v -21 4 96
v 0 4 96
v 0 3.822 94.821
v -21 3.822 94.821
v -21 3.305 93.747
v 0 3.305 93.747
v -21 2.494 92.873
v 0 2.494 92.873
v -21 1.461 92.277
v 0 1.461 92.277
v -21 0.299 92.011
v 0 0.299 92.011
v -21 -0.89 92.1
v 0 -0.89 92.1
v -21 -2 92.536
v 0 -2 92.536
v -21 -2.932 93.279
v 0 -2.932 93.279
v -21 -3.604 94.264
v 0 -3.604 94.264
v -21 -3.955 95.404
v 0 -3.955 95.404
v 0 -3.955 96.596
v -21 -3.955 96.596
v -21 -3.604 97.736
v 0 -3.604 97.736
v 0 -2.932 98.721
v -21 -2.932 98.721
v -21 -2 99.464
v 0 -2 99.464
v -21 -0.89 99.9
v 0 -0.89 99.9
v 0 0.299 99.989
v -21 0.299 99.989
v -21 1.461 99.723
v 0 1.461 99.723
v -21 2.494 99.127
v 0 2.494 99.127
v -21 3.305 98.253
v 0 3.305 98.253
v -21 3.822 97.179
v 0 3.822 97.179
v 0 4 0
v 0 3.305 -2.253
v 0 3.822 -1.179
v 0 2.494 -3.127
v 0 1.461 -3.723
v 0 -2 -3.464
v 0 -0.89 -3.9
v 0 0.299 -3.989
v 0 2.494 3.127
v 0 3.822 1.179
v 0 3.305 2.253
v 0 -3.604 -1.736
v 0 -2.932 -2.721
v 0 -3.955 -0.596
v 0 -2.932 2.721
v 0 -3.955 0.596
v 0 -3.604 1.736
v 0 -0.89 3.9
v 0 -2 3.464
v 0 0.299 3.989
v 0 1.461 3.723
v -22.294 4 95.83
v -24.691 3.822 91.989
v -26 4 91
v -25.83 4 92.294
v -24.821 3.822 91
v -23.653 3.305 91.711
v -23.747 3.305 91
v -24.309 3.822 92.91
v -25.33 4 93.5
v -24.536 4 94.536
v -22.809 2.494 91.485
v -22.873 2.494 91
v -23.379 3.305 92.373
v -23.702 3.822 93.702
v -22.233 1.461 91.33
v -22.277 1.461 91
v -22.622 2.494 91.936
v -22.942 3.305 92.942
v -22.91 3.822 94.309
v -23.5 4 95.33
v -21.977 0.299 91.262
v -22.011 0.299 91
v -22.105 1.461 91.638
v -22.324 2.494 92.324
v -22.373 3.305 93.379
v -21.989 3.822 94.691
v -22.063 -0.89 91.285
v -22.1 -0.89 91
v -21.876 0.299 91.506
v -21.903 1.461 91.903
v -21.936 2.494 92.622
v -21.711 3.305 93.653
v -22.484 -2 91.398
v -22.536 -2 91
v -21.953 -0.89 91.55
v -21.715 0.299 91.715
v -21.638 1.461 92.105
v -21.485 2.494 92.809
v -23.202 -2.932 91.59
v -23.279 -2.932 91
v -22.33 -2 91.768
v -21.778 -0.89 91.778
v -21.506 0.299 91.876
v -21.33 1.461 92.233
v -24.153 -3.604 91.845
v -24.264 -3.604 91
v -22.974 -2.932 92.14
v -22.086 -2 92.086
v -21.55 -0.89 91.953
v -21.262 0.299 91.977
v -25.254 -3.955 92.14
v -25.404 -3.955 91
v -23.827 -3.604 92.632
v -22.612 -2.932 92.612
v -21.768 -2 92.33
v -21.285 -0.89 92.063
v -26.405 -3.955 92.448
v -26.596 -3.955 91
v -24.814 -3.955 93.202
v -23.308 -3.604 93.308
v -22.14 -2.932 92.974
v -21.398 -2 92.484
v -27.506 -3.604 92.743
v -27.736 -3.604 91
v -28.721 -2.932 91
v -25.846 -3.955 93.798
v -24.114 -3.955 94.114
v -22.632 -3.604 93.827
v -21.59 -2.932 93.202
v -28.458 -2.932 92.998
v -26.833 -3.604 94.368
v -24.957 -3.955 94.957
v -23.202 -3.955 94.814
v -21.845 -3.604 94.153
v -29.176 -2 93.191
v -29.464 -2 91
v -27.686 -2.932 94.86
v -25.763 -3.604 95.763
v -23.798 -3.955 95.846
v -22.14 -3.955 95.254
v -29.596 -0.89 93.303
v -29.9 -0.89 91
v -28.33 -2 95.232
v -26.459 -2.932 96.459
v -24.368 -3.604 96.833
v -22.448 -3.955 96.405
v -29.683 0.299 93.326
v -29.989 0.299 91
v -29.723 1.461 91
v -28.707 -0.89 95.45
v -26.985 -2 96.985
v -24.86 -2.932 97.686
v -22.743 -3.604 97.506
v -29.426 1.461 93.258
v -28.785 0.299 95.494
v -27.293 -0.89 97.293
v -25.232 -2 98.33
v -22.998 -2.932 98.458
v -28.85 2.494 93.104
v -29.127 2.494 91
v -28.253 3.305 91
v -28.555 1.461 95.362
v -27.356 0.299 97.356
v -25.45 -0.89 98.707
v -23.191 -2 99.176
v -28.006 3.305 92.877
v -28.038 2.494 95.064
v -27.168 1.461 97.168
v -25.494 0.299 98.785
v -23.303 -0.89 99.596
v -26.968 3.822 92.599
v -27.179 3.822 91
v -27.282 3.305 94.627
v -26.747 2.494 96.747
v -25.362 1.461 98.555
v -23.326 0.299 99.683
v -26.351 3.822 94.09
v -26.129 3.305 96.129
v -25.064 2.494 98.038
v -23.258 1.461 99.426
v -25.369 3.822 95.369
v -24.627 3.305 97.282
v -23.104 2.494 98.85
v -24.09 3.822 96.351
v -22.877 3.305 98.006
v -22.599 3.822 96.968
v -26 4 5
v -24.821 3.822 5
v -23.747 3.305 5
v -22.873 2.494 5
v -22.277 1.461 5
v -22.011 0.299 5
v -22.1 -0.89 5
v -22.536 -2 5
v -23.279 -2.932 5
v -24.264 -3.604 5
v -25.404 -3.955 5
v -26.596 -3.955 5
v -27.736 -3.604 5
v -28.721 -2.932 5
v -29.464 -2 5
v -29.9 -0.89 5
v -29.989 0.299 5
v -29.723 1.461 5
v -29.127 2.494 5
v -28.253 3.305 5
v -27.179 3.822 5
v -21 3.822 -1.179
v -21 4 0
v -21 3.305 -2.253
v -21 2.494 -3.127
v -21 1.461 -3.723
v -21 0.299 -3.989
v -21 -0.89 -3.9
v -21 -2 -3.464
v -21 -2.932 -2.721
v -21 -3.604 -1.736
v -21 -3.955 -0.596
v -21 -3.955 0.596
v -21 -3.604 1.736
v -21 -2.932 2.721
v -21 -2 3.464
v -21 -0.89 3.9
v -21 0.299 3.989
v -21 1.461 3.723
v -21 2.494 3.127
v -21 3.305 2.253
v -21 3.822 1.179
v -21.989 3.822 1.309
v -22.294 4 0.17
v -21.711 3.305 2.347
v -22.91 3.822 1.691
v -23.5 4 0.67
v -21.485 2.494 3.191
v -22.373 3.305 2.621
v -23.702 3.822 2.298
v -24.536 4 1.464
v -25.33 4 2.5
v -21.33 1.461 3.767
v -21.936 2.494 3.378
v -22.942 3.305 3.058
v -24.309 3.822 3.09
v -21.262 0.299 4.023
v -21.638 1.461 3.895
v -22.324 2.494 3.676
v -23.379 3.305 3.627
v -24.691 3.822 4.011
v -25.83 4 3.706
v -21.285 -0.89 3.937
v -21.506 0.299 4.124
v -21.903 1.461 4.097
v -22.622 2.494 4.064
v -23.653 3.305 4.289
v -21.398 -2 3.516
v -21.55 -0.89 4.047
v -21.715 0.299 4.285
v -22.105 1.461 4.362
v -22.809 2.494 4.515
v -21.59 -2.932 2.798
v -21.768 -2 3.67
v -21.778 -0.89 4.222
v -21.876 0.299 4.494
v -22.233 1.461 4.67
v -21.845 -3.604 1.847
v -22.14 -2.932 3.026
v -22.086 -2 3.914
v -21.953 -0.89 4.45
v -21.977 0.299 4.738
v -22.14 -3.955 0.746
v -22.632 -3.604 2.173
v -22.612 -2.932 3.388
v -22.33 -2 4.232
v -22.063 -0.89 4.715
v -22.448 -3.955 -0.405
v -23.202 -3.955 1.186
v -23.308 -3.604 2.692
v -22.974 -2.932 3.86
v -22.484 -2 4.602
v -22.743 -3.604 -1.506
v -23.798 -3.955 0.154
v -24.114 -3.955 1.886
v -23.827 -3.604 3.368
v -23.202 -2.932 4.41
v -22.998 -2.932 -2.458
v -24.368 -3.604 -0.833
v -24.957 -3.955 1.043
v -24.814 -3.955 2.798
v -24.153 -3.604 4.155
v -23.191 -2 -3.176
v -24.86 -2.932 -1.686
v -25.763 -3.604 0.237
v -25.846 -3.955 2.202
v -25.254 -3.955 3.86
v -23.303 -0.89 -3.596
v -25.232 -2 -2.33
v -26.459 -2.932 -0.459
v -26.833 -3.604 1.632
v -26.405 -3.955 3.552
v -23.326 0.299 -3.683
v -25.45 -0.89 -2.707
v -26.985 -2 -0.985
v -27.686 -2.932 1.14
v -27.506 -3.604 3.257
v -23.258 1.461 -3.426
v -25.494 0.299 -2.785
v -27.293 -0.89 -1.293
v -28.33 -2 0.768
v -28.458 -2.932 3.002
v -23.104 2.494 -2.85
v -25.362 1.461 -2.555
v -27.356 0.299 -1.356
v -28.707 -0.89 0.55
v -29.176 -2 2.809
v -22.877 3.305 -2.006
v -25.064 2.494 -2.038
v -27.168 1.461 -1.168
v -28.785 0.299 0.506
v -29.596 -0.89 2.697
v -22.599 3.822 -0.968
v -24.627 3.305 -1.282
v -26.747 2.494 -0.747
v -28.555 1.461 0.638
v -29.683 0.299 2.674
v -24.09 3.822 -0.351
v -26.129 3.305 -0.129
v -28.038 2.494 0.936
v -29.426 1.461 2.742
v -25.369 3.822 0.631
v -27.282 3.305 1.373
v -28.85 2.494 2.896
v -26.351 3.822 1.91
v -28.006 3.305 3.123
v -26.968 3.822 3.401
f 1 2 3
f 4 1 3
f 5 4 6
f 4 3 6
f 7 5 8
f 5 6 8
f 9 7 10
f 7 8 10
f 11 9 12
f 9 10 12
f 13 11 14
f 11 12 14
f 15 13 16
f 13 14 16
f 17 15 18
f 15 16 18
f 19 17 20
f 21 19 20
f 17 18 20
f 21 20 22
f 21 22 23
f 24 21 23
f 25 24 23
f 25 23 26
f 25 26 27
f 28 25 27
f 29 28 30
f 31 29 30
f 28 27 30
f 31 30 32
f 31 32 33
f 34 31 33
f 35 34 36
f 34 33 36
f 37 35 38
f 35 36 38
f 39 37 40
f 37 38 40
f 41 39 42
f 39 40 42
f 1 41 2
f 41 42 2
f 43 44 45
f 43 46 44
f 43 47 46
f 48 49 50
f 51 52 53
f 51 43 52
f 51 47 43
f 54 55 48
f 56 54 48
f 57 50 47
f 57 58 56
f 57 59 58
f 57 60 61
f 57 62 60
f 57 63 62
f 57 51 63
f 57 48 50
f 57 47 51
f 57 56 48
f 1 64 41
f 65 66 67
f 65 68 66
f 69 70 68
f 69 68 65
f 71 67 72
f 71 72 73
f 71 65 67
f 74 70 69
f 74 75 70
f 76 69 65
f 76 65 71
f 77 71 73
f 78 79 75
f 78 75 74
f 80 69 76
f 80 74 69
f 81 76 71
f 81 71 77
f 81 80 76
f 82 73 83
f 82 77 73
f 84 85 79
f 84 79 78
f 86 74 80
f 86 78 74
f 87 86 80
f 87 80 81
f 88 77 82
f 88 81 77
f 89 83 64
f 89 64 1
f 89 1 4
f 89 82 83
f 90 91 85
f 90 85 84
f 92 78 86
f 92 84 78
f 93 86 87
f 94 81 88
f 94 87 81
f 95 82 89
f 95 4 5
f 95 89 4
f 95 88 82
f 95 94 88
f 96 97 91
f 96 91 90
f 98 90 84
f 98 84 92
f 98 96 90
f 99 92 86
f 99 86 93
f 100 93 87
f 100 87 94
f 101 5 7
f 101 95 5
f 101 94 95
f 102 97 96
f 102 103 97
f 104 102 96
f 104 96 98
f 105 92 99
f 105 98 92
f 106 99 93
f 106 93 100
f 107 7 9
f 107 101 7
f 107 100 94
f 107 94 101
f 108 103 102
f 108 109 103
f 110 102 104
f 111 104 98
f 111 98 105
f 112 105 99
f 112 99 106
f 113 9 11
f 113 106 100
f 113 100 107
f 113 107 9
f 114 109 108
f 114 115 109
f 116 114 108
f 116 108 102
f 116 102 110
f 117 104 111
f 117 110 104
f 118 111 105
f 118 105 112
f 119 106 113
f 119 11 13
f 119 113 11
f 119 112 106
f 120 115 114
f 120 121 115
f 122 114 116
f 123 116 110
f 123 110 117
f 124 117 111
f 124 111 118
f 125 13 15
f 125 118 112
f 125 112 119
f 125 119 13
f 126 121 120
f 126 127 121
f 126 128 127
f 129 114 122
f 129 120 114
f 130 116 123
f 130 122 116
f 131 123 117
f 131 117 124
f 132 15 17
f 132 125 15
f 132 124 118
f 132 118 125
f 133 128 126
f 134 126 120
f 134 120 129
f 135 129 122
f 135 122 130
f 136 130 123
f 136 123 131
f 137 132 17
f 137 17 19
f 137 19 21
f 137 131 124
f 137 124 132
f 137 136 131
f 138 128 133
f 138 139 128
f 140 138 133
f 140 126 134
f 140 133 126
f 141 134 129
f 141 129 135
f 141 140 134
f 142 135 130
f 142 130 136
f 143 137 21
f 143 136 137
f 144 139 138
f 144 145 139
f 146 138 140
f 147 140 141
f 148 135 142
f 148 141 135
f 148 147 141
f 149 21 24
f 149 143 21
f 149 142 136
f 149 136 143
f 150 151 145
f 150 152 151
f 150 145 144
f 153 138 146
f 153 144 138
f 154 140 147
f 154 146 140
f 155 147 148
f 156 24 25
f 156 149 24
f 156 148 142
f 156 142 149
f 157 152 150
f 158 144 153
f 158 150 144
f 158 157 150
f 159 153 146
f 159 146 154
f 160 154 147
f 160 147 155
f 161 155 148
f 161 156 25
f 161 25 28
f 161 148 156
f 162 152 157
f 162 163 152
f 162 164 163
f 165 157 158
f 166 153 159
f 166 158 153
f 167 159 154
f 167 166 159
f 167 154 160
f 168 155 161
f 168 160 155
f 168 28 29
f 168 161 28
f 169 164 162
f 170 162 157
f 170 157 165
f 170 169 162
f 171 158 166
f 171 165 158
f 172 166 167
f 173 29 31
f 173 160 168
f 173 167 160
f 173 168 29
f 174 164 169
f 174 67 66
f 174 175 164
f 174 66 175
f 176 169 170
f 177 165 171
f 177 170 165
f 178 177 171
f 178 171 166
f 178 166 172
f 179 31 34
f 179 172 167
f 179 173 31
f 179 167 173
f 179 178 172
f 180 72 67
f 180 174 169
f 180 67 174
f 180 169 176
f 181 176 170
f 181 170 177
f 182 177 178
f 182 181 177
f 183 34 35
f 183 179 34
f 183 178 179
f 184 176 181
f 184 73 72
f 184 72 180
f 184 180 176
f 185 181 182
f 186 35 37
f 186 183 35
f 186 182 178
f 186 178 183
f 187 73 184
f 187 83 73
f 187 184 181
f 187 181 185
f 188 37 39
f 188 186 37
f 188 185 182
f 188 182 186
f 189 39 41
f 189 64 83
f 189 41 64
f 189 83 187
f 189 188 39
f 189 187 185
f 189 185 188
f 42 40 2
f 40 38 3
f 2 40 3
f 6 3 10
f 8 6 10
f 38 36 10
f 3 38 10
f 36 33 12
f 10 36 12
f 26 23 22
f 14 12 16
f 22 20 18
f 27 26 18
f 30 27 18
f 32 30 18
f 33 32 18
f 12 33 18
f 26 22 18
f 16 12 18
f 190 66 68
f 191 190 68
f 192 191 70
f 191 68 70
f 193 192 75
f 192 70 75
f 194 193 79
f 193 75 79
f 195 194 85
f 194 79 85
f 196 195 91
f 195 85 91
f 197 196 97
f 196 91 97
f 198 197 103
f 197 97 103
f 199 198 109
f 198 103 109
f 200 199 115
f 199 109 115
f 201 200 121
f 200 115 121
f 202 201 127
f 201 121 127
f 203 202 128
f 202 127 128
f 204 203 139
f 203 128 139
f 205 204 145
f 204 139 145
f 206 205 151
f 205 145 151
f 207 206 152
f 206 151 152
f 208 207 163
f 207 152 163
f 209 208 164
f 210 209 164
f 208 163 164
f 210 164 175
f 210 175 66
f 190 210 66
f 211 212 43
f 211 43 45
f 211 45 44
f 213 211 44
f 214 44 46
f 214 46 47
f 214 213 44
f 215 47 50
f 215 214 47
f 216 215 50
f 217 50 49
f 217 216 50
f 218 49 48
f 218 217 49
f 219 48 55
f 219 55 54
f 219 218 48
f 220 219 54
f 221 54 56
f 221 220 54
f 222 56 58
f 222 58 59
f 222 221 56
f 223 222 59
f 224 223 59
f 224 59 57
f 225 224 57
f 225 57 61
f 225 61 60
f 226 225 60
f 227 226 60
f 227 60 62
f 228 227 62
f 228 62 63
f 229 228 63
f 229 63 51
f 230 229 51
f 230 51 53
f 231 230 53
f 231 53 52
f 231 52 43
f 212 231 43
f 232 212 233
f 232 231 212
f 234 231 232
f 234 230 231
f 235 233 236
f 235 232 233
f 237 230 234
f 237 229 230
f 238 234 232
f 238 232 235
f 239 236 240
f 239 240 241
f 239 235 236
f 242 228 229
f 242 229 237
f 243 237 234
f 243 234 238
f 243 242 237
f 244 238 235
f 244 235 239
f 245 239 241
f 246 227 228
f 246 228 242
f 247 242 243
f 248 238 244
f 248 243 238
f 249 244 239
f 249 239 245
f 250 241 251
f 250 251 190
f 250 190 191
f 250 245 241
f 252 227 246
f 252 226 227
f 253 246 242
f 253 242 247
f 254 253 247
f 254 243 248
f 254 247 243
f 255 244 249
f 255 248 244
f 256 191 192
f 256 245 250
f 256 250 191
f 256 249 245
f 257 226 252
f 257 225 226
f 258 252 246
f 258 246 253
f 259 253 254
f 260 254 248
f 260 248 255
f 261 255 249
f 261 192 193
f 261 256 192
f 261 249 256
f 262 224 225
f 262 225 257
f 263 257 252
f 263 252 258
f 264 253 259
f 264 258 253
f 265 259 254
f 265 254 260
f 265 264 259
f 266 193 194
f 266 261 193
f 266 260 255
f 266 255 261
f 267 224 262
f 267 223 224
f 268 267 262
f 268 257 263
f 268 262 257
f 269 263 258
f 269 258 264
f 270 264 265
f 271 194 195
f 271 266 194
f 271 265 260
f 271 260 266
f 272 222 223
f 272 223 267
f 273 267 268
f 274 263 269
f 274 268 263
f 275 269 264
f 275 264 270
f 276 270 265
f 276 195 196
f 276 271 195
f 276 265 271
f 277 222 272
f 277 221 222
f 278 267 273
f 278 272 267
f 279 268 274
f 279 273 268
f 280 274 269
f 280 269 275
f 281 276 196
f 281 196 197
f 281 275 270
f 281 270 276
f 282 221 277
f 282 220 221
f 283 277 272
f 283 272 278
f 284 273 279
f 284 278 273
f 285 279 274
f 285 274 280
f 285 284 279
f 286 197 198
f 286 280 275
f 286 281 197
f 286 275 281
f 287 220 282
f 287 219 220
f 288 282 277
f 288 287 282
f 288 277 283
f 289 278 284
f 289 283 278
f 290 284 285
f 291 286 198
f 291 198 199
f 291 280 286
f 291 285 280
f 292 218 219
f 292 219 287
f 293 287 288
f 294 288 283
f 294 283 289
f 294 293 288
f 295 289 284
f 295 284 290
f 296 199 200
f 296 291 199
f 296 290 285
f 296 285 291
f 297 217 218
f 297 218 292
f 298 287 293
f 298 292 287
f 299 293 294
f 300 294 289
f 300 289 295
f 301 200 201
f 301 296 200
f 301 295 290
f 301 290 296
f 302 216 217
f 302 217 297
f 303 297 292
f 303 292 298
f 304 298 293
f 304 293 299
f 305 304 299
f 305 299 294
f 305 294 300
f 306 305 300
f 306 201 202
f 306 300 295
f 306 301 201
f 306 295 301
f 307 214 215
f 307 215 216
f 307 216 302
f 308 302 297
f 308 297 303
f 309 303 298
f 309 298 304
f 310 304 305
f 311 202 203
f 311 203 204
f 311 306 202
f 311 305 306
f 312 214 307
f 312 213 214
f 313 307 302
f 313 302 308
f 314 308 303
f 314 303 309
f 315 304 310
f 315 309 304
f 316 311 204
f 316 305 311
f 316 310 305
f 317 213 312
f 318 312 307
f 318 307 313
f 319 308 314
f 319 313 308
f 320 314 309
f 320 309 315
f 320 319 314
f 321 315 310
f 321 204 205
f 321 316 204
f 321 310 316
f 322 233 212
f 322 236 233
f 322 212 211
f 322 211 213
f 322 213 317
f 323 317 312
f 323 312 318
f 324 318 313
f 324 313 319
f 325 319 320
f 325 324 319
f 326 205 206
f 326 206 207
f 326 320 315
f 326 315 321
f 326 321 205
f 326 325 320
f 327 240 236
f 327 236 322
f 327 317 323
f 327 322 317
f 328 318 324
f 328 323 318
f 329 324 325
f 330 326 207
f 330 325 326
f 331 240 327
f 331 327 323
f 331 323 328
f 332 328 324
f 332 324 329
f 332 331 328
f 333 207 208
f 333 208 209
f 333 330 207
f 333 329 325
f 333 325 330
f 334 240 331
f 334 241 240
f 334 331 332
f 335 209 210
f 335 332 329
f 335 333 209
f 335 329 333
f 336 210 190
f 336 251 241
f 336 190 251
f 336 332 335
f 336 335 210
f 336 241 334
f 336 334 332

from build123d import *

# Parameters (mm, degrees)
F1_R = 4


with BuildPart() as f2:
    # F2: sweep along a path in F0
    with BuildLine(Plane.XZ) as f2_path:
        Line((0, 0), (-21, 0))
        ThreePointArc((-21, 0), (-24.535534, 1.464466), (-26, 5))
        Line((-26, 5), (-26, 91))
        ThreePointArc((-26, 91), (-24.535534, 94.535534), (-21, 96))
        Line((-21, 96), (0, 96))
    # F1 (on Right) → F2 (sweep)
    with BuildSketch(Plane.YZ):
        Circle(F1_R)
    sweep(path=f2_path.line)


solid = f2.part
